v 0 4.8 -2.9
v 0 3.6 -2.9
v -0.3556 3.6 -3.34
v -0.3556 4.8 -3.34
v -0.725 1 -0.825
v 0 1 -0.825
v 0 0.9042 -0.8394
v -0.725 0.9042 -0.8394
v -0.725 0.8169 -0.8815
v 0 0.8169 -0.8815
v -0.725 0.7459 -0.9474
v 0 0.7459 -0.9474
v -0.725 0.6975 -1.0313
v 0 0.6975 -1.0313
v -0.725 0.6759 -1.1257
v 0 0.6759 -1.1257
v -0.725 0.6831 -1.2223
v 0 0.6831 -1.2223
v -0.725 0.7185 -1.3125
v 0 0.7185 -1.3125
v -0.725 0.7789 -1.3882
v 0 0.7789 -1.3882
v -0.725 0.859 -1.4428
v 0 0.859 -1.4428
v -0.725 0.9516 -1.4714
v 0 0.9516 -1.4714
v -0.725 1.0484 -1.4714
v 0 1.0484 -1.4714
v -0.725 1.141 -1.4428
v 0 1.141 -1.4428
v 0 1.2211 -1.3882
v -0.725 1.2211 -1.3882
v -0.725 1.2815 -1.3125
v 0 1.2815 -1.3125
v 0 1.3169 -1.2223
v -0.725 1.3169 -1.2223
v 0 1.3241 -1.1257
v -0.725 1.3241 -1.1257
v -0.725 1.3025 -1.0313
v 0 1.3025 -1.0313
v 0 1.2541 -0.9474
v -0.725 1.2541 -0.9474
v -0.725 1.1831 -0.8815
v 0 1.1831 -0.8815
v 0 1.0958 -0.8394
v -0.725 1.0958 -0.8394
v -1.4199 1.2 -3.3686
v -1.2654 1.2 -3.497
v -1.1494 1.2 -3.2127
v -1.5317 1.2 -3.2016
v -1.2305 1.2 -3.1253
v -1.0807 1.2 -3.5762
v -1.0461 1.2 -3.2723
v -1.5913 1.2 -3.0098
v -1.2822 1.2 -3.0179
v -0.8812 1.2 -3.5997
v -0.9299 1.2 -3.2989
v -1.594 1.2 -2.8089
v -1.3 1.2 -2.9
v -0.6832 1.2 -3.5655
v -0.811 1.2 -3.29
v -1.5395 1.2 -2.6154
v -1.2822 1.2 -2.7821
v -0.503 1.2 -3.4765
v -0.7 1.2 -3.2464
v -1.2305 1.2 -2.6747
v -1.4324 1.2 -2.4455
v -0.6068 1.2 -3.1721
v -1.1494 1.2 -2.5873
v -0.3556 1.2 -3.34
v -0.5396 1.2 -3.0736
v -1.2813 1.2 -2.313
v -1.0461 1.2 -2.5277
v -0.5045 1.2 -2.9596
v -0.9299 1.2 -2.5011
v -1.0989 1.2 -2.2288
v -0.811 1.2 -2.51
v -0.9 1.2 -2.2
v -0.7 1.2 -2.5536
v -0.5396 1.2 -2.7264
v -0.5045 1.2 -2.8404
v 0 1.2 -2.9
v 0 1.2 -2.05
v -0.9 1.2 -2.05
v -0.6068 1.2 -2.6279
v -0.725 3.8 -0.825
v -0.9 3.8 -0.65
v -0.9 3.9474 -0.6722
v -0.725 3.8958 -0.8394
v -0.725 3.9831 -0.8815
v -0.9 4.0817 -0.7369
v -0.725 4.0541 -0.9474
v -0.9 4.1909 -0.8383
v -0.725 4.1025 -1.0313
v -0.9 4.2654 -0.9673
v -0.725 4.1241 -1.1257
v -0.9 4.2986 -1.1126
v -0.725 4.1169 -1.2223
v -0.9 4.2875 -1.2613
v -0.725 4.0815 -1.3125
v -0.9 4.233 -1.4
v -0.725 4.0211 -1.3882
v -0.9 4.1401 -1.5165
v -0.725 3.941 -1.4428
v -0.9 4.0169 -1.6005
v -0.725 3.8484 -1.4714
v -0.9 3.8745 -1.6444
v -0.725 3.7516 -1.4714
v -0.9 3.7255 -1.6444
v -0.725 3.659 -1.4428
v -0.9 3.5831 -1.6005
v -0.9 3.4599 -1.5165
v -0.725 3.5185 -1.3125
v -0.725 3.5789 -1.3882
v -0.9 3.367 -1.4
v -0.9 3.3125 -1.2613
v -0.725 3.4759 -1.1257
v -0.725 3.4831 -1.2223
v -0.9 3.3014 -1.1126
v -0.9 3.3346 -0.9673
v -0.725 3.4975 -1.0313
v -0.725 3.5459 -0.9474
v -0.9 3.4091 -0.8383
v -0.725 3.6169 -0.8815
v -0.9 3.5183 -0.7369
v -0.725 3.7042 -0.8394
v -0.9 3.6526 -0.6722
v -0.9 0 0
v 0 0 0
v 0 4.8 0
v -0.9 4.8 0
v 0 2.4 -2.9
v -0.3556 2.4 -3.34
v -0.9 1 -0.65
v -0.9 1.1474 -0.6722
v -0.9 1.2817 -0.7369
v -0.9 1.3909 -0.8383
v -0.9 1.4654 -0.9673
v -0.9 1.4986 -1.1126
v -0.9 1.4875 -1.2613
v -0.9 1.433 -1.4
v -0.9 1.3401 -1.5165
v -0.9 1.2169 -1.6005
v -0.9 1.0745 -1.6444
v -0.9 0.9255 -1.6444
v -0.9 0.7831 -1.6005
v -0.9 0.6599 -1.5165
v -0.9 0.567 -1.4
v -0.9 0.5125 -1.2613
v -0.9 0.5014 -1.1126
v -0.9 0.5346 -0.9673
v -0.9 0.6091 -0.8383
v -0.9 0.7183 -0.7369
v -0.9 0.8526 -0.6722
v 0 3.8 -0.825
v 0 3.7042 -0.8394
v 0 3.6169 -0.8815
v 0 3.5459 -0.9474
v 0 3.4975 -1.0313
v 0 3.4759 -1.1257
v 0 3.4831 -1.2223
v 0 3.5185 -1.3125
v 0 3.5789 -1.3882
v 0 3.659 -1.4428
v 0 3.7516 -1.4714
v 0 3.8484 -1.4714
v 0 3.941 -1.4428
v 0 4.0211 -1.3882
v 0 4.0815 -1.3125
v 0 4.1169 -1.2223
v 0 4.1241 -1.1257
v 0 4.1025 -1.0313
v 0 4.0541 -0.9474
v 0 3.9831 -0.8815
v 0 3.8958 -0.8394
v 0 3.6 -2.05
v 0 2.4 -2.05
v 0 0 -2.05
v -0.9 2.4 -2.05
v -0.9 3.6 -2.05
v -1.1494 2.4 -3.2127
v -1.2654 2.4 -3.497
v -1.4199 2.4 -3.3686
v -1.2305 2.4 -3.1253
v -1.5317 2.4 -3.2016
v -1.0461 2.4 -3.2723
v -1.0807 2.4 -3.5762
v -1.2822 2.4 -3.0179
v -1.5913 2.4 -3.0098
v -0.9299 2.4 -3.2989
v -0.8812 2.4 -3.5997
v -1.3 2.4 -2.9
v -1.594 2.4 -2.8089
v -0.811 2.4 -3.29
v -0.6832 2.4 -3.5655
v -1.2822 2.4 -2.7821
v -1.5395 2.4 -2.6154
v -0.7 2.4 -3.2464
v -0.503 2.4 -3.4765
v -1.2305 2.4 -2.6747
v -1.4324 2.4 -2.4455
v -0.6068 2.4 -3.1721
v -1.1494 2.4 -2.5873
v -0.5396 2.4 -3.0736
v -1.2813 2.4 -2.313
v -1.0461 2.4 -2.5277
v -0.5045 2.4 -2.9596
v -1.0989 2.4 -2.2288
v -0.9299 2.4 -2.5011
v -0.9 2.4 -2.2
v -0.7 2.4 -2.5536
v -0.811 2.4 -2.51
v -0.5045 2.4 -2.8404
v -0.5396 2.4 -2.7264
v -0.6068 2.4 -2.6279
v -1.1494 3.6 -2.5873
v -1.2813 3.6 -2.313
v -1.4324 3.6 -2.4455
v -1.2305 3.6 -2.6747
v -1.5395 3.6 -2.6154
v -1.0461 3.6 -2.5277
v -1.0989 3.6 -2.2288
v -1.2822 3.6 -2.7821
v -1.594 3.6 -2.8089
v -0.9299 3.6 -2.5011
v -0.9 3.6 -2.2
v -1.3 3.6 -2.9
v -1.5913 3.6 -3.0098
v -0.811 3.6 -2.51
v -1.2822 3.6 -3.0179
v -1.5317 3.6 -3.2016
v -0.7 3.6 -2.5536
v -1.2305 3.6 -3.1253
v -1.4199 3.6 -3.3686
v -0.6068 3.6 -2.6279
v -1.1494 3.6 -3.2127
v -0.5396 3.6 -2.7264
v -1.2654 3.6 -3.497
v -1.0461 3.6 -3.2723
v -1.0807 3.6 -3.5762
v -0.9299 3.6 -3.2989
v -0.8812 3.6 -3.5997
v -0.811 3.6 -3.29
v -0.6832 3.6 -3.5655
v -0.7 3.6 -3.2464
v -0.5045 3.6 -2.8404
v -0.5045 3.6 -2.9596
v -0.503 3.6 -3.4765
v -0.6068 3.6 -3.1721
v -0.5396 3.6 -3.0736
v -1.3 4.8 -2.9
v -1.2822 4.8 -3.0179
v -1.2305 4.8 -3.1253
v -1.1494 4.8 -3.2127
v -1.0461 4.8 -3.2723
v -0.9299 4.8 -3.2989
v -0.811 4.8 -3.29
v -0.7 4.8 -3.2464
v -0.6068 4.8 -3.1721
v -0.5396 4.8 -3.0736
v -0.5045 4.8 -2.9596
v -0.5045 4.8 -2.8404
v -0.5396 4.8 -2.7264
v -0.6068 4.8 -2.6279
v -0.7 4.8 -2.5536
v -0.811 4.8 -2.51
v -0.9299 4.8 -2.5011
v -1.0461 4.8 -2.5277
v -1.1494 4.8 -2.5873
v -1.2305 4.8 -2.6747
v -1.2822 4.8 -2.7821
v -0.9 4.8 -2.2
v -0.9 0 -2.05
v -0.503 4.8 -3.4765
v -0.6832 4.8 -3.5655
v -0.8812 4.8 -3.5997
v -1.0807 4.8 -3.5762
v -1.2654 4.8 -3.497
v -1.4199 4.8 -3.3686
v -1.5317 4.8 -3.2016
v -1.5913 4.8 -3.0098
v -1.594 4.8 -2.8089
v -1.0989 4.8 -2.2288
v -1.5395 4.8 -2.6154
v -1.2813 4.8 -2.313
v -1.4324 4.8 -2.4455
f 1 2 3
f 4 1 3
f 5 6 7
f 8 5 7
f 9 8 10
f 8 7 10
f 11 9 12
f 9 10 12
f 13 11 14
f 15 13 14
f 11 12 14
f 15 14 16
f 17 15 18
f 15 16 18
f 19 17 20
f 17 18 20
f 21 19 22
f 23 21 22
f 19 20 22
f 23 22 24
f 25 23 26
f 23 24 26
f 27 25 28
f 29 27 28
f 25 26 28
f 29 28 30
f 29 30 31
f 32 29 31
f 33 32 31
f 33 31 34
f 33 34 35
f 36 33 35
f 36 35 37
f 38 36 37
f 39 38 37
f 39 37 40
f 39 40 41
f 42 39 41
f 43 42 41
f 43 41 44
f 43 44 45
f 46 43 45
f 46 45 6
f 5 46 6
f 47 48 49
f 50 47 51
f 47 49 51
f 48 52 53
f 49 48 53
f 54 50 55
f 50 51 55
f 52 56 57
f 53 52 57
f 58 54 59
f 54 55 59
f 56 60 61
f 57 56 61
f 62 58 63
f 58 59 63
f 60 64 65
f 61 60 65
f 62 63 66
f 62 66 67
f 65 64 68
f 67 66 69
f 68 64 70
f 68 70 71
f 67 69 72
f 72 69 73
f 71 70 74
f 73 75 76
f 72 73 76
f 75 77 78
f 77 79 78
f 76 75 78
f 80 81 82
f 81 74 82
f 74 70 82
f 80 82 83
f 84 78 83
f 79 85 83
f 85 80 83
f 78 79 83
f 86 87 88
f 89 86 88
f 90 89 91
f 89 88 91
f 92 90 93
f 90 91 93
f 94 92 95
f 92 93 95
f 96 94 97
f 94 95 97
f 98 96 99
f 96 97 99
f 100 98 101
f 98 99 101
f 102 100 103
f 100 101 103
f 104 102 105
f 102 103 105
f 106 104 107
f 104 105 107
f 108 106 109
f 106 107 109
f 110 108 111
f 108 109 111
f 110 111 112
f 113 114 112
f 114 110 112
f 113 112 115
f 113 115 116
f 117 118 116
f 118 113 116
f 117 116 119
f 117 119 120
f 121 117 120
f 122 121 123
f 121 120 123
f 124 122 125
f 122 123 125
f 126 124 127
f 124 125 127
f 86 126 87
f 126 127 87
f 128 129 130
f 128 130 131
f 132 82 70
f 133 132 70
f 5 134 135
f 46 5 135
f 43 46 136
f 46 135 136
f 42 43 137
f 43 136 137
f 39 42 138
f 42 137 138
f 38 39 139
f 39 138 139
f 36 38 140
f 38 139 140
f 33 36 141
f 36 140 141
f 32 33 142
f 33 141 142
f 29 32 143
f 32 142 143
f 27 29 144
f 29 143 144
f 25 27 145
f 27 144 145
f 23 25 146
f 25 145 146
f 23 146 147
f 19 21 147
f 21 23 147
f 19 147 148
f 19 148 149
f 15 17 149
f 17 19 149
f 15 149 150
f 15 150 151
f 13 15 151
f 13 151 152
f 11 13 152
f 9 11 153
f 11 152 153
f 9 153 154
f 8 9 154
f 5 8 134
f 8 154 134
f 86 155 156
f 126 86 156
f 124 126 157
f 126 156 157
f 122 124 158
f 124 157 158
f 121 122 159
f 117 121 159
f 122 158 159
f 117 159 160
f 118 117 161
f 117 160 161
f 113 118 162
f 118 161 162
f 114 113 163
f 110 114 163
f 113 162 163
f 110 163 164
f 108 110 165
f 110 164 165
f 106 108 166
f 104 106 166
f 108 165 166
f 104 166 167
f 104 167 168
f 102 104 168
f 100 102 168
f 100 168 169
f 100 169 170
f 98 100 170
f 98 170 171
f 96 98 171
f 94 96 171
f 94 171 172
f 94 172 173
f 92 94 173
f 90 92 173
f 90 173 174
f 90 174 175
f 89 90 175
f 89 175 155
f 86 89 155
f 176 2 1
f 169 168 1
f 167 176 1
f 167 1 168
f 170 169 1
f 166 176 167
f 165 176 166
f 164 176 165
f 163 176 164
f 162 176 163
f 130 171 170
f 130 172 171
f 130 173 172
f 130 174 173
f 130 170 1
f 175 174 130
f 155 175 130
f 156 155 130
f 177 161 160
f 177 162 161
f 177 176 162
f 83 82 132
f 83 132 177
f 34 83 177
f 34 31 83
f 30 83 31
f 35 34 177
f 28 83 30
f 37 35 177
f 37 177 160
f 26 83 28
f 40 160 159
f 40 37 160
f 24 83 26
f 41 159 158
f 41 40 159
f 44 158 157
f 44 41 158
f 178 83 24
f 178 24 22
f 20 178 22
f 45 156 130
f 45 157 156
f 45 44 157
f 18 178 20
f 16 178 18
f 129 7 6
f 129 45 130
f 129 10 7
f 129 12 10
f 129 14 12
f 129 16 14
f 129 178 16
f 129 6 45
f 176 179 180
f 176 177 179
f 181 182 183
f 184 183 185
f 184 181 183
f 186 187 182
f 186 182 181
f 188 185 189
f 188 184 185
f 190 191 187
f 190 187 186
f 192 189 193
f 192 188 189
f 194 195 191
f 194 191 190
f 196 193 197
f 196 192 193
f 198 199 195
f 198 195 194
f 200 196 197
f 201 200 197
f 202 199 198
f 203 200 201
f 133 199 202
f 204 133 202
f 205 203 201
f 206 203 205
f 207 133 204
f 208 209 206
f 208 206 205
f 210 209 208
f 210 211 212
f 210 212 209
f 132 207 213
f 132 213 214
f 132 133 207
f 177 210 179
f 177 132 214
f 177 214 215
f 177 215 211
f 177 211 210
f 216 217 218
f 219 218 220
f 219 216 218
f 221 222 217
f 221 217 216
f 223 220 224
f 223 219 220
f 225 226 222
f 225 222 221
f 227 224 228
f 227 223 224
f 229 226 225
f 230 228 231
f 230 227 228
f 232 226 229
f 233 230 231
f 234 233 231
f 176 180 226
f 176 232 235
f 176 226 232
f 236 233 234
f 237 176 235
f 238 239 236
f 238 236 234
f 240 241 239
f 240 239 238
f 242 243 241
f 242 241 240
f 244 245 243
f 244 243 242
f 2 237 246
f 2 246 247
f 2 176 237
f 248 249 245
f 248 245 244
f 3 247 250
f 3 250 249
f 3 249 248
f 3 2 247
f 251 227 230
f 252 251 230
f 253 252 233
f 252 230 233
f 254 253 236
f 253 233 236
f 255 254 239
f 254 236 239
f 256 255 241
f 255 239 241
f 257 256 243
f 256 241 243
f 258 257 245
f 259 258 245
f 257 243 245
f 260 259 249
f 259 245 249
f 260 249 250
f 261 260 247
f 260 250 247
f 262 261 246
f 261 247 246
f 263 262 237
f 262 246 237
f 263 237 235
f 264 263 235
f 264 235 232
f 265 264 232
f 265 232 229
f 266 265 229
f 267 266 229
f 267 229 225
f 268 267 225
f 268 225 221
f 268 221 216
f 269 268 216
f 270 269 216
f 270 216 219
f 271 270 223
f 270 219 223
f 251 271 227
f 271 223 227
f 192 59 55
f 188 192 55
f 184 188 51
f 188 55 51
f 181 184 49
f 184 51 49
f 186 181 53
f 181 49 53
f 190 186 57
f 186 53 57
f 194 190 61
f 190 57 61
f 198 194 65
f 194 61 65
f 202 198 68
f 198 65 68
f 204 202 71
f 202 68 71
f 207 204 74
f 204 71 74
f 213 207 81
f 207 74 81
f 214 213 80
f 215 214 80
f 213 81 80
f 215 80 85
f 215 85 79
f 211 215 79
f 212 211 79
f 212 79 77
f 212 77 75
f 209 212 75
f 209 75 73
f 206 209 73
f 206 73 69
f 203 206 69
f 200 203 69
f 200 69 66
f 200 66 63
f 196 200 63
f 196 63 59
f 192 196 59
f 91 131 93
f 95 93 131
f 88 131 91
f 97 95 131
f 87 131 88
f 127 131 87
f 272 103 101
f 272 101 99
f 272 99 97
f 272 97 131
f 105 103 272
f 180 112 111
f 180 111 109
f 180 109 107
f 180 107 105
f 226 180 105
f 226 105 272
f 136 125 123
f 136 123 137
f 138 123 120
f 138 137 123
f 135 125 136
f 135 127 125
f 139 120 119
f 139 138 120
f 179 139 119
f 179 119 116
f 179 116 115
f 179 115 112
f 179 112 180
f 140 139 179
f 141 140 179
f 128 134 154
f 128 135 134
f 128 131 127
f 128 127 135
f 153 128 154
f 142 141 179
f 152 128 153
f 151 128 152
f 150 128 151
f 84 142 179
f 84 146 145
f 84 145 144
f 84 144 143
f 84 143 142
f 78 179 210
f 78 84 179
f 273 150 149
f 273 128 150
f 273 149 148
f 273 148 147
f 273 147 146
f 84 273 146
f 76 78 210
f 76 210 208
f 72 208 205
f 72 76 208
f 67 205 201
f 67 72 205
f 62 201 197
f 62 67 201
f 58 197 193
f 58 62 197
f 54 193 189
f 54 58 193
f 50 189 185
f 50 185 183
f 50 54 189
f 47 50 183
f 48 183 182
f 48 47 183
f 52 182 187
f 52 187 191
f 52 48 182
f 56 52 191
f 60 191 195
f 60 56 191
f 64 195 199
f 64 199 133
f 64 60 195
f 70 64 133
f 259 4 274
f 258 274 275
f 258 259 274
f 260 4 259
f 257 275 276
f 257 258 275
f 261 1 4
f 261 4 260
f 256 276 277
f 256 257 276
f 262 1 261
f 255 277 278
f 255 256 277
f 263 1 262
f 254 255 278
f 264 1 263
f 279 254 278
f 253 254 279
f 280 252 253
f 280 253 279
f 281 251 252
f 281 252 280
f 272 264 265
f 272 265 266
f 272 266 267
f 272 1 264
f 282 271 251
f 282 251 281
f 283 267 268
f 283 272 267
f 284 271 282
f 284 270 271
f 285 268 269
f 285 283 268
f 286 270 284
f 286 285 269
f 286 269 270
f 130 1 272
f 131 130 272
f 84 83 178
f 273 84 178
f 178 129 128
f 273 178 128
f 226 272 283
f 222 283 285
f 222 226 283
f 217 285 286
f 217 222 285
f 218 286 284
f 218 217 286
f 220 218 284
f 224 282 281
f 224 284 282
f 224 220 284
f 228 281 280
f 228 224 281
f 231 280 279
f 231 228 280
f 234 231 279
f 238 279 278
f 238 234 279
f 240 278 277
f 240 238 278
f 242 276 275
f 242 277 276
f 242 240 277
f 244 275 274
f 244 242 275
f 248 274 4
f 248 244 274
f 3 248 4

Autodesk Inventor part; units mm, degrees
ref_plane "YZ Plane" through (0, 0, 0) normal (1, 0, 0) x (0, 1, 0)
ref_plane "XZ Plane" through (0, 0, 0) normal (0, 1, 0) x (-1, 0, 0)
ref_plane "XY Plane" through (0, 0, 0) normal (0, 0, 1) x (1, 0, 0)
sketch "Skizze1" plane through (0, 0, 0) normal (0, 1, 0) x (-1, 0, 0)
  line L0 (0, 0) -> (0.9, 0)
  line L1 (0.9, 0) -> (0.9, -2.9)
  line L2 (0.9, -2.9) -> (0, -2.9) construction
  line L3 (0, -2.9) -> (0, 0)
  circle A0 centre (0.9, -2.9) radius 0.4
  arc A1 (0.3556, -3.34) -> (0.9, -2.2) centre (0.9, -2.9) ccw
  line L4 (0, -2.9) -> (0.3556, -3.34)
  dimension "d0" = 0.9
  dimension "d2" = 0.8
  dimension "d3" = 1.4
  dimension "d4" = 2.9
extrude "Extrusion1" add sketch "Skizze1" along normal blind 4.8
sketch "Skizze2" plane through (0, 0, 0) normal (1, 0, 0) x (0, 0, -1)
  line L0 (2.9, 0) -> (0, 0) construction
  line L1 (2.9, 0) -> (2.9, 4.8) construction
  line L2 (0, 4.8) -> (2.9, 4.8) construction
  line L3 (0, 0) -> (0, 4.8) construction
  line L4 (0, 4.8) -> (2.9, 4.8) construction
  line L5 (2.05, 4.8) -> (2.05, 0) construction
  line L6 (2.05, 0) -> (4.05, 0)
  line L7 (4.05, 0) -> (4.05, 1.2)
  line L8 (4.05, 1.2) -> (2.05, 1.2)
  line L9 (2.05, 1.2) -> (2.05, 0)
  line L10 (2.05, 3.6) -> (4.05, 3.6)
  line L11 (4.05, 3.6) -> (4.05, 2.4)
  line L12 (4.05, 2.4) -> (2.05, 2.4)
  line L13 (2.05, 2.4) -> (2.05, 3.6)
  dimension "d7" = 0.85
  dimension "d8" = 2
  dimension "d9" = 1.2
  dimension "d10" = 1.2
  dimension "d11" = 1.2
extrude "Extrusion2" cut sketch "Skizze2" against normal blind 4
sketch "Skizze4" plane through (-0.9, 0, 0) normal (-1, 0, 0) x (0, 0, 1)
  line L0 (-2.05, 1.2) -> (-2.05, 0) construction
  line L1 (0, 0) -> (-2.05, 0) construction
  line L2 (0, 0) -> (0, 4.8) construction
  line L3 (-2.2, 4.8) -> (0, 4.8) construction
  line L4 (-2.2, 3.6) -> (-2.2, 4.8) construction
  line L5 (-2.2, 3.6) -> (-2.05, 3.6) construction
  line L6 (-2.05, 3.6) -> (-2.05, 2.4) construction
  line L7 (-2.05, 2.4) -> (-2.2, 2.4) construction
  line L8 (-2.2, 1.2) -> (-2.2, 2.4) construction
  line L9 (-2.2, 1.2) -> (-2.05, 1.2) construction
  line L10 (0, 0) -> (0, 4.8) construction
  line L11 (-1.15, 3.8) -> (-1.15, 1) construction
  line L12 (0, 2.4) -> (-2.05, 2.4) construction
  point P0 (-1.15, 2.4)
  dimension "d30" = 2.8
  dimension "d31" = 1.15
hole "Bohrung2" at (-0.9, 3.8, -1.15) at (-0.9, 1, -1.15) direction (1, 0, 0) diameter 0.65 end through all countersink diameter 1 countersink angle 90
properties part number "item_scharnier_2_teil"
